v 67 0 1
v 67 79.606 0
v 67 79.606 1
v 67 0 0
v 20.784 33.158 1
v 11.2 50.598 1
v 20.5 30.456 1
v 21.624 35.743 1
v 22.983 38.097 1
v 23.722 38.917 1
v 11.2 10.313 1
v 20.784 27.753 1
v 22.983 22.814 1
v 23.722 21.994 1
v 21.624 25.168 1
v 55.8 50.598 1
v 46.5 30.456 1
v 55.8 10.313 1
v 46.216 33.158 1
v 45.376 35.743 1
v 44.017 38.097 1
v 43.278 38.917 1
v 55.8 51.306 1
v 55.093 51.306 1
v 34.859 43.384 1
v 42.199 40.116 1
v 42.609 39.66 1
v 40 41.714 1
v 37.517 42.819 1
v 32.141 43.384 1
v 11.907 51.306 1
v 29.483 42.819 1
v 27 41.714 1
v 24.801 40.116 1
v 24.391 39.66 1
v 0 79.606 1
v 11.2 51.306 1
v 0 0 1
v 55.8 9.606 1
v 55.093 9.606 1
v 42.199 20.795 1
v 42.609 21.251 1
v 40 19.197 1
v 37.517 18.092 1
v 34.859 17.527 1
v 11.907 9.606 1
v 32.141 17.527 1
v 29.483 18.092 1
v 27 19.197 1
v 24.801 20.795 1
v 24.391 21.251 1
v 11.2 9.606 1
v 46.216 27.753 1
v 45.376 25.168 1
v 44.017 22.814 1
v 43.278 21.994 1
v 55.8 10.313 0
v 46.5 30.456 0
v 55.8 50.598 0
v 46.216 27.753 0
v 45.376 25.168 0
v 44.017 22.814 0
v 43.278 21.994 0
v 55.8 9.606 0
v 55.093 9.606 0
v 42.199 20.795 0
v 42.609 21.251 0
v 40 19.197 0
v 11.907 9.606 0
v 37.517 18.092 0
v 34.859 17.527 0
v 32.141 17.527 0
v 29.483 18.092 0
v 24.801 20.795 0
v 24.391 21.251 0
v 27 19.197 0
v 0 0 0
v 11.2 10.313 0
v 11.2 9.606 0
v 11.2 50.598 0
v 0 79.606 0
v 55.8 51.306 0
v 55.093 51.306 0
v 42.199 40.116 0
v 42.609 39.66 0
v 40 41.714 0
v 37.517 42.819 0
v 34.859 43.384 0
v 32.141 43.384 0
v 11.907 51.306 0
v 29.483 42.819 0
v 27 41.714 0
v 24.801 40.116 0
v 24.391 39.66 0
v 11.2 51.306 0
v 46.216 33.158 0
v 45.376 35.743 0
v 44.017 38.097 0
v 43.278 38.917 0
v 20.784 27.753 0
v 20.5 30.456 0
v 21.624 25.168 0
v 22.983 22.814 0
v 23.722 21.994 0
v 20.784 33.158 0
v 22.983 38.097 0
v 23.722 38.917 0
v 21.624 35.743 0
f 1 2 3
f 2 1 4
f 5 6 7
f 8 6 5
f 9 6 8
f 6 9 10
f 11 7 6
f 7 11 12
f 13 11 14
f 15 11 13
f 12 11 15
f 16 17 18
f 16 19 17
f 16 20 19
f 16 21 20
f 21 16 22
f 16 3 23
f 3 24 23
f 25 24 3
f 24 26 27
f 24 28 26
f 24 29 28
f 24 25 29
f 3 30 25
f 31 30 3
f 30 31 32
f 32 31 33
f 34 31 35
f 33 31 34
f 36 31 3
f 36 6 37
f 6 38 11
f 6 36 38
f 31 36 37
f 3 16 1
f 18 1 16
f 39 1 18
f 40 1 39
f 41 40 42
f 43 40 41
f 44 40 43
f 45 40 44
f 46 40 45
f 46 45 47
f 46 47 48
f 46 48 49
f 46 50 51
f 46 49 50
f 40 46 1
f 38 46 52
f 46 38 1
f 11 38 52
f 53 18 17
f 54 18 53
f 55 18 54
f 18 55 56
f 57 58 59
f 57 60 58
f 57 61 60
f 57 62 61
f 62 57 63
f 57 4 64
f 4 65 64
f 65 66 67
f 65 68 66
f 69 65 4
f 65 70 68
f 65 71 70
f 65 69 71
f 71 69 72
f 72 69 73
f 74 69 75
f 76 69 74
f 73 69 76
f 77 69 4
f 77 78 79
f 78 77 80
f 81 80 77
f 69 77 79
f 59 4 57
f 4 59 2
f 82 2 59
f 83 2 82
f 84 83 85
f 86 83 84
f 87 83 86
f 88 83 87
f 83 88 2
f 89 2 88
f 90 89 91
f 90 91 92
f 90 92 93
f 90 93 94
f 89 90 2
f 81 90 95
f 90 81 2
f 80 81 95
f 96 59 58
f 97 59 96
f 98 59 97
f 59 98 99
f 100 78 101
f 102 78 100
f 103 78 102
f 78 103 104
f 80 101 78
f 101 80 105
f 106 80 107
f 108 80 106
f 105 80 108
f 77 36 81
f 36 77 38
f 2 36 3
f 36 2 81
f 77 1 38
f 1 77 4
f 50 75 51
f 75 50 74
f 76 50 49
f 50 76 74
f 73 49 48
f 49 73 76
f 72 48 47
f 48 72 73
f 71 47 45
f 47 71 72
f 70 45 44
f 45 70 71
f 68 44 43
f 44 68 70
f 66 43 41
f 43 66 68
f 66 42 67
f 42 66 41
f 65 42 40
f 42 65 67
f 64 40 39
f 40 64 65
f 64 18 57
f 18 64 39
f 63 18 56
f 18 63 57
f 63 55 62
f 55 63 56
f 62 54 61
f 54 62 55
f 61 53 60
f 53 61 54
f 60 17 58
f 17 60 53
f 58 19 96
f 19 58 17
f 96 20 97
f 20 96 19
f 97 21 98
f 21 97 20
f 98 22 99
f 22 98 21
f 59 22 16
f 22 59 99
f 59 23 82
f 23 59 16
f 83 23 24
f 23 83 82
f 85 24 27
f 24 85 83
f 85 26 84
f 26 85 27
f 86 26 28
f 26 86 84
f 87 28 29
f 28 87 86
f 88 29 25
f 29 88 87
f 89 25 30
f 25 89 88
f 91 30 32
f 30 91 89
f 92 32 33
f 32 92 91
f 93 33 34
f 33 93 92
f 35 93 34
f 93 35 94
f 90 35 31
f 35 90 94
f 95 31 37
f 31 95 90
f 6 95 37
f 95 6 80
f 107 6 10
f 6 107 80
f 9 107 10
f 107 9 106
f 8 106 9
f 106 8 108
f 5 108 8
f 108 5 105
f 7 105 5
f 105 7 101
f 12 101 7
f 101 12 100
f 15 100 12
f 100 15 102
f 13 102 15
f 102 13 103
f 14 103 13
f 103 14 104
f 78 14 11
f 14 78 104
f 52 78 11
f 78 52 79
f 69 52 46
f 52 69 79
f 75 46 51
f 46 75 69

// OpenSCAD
// file: settings.scad
// we will define a bayit to have a top cube (where the scroll(s) go) and a base rectangle
// each will have x, y, and z measurements
// also we need an offset to locate the cube on top of the base



your_name = ["יוסף יצחק",
             "בן",
             "זלמן שמואל"];
// these measurements are from my rashi shel rosh (shins on the sides are already factored in)
strap_width = 16;
top = [44.6, 41.7, 43.9];
base_raw = [56.9, 77.0, 20.2];
offset_raw = [6.4, 7.0, base_raw.z];

padding_thickness = 1.2; // thickness of the padding you will put inside the box. in my case i have 1mm thick felt

strap_percent = .7;


// computed based off the measurements provided. no need to tamper with these
diagonal = sqrt(pow(base_raw.y, 2) + pow(base_raw.z, 2));
offset = [max(strap_width*strap_percent, offset_raw.x), offset_raw.y+diagonal-base_raw.y, base_raw.z];
base = [top.x+2*max(strap_width*strap_percent, offset_raw.x), diagonal, base_raw.z]; // calculated to allow the bottom to clear the corner when opening

bevel_radius = 2.5; // wall thickness
slop = 2*(padding_thickness+bevel_radius);

// hinge related settings
extra_hinge_space = 1;

bump = [bevel_radius*0.8, 0.4, 44]; // diameter, height, angle
arm = [bevel_radius, 1.25, extra_hinge_space, 0];  // height, thickness, extra, esides
dim = [base.x, 22, 0.1];  // len, hinges(>=2), clearance, 0:male 1:female 2:reverable
patt = [0, 1];  // 0:bump-norm 1:bump-rev 2:dimp-norm 3:dimp:rev

hinge = [dim, patt, arm, bump];

epsilon = 0.001;
// main file
include <settings.scad>
a = sqrt(2)/2;

difference(){
    cube([base.x, base.y, 1]);

    translate([top.x/2+offset.x, top.y/2+offset.y, -.5])
    linear_extrude(height = 2)
    union(){
        circle(13);
        polygon(points = [
                            [0, -a],
                            [-top.x/2+a, -top.y/2],
                            [-top.x/2, -top.y/2],
                            [-top.x/2, -top.y/2+a],

                            [-a, 0],
                            [-top.x/2, top.y/2-a],
                            [-top.x/2, top.y/2],
                            [-top.x/2+a, top.y/2],

                            [0, a],
                            [top.x/2-a, top.y/2],
                            [top.x/2, top.y/2],
                            [top.x/2, top.y/2-a],

                            [a, 0],
                            [top.x/2, -top.y/2+a],
                            [top.x/2, -top.y/2],
                            [top.x/2-a, -top.y/2]
                        ]
        );
    }
}
